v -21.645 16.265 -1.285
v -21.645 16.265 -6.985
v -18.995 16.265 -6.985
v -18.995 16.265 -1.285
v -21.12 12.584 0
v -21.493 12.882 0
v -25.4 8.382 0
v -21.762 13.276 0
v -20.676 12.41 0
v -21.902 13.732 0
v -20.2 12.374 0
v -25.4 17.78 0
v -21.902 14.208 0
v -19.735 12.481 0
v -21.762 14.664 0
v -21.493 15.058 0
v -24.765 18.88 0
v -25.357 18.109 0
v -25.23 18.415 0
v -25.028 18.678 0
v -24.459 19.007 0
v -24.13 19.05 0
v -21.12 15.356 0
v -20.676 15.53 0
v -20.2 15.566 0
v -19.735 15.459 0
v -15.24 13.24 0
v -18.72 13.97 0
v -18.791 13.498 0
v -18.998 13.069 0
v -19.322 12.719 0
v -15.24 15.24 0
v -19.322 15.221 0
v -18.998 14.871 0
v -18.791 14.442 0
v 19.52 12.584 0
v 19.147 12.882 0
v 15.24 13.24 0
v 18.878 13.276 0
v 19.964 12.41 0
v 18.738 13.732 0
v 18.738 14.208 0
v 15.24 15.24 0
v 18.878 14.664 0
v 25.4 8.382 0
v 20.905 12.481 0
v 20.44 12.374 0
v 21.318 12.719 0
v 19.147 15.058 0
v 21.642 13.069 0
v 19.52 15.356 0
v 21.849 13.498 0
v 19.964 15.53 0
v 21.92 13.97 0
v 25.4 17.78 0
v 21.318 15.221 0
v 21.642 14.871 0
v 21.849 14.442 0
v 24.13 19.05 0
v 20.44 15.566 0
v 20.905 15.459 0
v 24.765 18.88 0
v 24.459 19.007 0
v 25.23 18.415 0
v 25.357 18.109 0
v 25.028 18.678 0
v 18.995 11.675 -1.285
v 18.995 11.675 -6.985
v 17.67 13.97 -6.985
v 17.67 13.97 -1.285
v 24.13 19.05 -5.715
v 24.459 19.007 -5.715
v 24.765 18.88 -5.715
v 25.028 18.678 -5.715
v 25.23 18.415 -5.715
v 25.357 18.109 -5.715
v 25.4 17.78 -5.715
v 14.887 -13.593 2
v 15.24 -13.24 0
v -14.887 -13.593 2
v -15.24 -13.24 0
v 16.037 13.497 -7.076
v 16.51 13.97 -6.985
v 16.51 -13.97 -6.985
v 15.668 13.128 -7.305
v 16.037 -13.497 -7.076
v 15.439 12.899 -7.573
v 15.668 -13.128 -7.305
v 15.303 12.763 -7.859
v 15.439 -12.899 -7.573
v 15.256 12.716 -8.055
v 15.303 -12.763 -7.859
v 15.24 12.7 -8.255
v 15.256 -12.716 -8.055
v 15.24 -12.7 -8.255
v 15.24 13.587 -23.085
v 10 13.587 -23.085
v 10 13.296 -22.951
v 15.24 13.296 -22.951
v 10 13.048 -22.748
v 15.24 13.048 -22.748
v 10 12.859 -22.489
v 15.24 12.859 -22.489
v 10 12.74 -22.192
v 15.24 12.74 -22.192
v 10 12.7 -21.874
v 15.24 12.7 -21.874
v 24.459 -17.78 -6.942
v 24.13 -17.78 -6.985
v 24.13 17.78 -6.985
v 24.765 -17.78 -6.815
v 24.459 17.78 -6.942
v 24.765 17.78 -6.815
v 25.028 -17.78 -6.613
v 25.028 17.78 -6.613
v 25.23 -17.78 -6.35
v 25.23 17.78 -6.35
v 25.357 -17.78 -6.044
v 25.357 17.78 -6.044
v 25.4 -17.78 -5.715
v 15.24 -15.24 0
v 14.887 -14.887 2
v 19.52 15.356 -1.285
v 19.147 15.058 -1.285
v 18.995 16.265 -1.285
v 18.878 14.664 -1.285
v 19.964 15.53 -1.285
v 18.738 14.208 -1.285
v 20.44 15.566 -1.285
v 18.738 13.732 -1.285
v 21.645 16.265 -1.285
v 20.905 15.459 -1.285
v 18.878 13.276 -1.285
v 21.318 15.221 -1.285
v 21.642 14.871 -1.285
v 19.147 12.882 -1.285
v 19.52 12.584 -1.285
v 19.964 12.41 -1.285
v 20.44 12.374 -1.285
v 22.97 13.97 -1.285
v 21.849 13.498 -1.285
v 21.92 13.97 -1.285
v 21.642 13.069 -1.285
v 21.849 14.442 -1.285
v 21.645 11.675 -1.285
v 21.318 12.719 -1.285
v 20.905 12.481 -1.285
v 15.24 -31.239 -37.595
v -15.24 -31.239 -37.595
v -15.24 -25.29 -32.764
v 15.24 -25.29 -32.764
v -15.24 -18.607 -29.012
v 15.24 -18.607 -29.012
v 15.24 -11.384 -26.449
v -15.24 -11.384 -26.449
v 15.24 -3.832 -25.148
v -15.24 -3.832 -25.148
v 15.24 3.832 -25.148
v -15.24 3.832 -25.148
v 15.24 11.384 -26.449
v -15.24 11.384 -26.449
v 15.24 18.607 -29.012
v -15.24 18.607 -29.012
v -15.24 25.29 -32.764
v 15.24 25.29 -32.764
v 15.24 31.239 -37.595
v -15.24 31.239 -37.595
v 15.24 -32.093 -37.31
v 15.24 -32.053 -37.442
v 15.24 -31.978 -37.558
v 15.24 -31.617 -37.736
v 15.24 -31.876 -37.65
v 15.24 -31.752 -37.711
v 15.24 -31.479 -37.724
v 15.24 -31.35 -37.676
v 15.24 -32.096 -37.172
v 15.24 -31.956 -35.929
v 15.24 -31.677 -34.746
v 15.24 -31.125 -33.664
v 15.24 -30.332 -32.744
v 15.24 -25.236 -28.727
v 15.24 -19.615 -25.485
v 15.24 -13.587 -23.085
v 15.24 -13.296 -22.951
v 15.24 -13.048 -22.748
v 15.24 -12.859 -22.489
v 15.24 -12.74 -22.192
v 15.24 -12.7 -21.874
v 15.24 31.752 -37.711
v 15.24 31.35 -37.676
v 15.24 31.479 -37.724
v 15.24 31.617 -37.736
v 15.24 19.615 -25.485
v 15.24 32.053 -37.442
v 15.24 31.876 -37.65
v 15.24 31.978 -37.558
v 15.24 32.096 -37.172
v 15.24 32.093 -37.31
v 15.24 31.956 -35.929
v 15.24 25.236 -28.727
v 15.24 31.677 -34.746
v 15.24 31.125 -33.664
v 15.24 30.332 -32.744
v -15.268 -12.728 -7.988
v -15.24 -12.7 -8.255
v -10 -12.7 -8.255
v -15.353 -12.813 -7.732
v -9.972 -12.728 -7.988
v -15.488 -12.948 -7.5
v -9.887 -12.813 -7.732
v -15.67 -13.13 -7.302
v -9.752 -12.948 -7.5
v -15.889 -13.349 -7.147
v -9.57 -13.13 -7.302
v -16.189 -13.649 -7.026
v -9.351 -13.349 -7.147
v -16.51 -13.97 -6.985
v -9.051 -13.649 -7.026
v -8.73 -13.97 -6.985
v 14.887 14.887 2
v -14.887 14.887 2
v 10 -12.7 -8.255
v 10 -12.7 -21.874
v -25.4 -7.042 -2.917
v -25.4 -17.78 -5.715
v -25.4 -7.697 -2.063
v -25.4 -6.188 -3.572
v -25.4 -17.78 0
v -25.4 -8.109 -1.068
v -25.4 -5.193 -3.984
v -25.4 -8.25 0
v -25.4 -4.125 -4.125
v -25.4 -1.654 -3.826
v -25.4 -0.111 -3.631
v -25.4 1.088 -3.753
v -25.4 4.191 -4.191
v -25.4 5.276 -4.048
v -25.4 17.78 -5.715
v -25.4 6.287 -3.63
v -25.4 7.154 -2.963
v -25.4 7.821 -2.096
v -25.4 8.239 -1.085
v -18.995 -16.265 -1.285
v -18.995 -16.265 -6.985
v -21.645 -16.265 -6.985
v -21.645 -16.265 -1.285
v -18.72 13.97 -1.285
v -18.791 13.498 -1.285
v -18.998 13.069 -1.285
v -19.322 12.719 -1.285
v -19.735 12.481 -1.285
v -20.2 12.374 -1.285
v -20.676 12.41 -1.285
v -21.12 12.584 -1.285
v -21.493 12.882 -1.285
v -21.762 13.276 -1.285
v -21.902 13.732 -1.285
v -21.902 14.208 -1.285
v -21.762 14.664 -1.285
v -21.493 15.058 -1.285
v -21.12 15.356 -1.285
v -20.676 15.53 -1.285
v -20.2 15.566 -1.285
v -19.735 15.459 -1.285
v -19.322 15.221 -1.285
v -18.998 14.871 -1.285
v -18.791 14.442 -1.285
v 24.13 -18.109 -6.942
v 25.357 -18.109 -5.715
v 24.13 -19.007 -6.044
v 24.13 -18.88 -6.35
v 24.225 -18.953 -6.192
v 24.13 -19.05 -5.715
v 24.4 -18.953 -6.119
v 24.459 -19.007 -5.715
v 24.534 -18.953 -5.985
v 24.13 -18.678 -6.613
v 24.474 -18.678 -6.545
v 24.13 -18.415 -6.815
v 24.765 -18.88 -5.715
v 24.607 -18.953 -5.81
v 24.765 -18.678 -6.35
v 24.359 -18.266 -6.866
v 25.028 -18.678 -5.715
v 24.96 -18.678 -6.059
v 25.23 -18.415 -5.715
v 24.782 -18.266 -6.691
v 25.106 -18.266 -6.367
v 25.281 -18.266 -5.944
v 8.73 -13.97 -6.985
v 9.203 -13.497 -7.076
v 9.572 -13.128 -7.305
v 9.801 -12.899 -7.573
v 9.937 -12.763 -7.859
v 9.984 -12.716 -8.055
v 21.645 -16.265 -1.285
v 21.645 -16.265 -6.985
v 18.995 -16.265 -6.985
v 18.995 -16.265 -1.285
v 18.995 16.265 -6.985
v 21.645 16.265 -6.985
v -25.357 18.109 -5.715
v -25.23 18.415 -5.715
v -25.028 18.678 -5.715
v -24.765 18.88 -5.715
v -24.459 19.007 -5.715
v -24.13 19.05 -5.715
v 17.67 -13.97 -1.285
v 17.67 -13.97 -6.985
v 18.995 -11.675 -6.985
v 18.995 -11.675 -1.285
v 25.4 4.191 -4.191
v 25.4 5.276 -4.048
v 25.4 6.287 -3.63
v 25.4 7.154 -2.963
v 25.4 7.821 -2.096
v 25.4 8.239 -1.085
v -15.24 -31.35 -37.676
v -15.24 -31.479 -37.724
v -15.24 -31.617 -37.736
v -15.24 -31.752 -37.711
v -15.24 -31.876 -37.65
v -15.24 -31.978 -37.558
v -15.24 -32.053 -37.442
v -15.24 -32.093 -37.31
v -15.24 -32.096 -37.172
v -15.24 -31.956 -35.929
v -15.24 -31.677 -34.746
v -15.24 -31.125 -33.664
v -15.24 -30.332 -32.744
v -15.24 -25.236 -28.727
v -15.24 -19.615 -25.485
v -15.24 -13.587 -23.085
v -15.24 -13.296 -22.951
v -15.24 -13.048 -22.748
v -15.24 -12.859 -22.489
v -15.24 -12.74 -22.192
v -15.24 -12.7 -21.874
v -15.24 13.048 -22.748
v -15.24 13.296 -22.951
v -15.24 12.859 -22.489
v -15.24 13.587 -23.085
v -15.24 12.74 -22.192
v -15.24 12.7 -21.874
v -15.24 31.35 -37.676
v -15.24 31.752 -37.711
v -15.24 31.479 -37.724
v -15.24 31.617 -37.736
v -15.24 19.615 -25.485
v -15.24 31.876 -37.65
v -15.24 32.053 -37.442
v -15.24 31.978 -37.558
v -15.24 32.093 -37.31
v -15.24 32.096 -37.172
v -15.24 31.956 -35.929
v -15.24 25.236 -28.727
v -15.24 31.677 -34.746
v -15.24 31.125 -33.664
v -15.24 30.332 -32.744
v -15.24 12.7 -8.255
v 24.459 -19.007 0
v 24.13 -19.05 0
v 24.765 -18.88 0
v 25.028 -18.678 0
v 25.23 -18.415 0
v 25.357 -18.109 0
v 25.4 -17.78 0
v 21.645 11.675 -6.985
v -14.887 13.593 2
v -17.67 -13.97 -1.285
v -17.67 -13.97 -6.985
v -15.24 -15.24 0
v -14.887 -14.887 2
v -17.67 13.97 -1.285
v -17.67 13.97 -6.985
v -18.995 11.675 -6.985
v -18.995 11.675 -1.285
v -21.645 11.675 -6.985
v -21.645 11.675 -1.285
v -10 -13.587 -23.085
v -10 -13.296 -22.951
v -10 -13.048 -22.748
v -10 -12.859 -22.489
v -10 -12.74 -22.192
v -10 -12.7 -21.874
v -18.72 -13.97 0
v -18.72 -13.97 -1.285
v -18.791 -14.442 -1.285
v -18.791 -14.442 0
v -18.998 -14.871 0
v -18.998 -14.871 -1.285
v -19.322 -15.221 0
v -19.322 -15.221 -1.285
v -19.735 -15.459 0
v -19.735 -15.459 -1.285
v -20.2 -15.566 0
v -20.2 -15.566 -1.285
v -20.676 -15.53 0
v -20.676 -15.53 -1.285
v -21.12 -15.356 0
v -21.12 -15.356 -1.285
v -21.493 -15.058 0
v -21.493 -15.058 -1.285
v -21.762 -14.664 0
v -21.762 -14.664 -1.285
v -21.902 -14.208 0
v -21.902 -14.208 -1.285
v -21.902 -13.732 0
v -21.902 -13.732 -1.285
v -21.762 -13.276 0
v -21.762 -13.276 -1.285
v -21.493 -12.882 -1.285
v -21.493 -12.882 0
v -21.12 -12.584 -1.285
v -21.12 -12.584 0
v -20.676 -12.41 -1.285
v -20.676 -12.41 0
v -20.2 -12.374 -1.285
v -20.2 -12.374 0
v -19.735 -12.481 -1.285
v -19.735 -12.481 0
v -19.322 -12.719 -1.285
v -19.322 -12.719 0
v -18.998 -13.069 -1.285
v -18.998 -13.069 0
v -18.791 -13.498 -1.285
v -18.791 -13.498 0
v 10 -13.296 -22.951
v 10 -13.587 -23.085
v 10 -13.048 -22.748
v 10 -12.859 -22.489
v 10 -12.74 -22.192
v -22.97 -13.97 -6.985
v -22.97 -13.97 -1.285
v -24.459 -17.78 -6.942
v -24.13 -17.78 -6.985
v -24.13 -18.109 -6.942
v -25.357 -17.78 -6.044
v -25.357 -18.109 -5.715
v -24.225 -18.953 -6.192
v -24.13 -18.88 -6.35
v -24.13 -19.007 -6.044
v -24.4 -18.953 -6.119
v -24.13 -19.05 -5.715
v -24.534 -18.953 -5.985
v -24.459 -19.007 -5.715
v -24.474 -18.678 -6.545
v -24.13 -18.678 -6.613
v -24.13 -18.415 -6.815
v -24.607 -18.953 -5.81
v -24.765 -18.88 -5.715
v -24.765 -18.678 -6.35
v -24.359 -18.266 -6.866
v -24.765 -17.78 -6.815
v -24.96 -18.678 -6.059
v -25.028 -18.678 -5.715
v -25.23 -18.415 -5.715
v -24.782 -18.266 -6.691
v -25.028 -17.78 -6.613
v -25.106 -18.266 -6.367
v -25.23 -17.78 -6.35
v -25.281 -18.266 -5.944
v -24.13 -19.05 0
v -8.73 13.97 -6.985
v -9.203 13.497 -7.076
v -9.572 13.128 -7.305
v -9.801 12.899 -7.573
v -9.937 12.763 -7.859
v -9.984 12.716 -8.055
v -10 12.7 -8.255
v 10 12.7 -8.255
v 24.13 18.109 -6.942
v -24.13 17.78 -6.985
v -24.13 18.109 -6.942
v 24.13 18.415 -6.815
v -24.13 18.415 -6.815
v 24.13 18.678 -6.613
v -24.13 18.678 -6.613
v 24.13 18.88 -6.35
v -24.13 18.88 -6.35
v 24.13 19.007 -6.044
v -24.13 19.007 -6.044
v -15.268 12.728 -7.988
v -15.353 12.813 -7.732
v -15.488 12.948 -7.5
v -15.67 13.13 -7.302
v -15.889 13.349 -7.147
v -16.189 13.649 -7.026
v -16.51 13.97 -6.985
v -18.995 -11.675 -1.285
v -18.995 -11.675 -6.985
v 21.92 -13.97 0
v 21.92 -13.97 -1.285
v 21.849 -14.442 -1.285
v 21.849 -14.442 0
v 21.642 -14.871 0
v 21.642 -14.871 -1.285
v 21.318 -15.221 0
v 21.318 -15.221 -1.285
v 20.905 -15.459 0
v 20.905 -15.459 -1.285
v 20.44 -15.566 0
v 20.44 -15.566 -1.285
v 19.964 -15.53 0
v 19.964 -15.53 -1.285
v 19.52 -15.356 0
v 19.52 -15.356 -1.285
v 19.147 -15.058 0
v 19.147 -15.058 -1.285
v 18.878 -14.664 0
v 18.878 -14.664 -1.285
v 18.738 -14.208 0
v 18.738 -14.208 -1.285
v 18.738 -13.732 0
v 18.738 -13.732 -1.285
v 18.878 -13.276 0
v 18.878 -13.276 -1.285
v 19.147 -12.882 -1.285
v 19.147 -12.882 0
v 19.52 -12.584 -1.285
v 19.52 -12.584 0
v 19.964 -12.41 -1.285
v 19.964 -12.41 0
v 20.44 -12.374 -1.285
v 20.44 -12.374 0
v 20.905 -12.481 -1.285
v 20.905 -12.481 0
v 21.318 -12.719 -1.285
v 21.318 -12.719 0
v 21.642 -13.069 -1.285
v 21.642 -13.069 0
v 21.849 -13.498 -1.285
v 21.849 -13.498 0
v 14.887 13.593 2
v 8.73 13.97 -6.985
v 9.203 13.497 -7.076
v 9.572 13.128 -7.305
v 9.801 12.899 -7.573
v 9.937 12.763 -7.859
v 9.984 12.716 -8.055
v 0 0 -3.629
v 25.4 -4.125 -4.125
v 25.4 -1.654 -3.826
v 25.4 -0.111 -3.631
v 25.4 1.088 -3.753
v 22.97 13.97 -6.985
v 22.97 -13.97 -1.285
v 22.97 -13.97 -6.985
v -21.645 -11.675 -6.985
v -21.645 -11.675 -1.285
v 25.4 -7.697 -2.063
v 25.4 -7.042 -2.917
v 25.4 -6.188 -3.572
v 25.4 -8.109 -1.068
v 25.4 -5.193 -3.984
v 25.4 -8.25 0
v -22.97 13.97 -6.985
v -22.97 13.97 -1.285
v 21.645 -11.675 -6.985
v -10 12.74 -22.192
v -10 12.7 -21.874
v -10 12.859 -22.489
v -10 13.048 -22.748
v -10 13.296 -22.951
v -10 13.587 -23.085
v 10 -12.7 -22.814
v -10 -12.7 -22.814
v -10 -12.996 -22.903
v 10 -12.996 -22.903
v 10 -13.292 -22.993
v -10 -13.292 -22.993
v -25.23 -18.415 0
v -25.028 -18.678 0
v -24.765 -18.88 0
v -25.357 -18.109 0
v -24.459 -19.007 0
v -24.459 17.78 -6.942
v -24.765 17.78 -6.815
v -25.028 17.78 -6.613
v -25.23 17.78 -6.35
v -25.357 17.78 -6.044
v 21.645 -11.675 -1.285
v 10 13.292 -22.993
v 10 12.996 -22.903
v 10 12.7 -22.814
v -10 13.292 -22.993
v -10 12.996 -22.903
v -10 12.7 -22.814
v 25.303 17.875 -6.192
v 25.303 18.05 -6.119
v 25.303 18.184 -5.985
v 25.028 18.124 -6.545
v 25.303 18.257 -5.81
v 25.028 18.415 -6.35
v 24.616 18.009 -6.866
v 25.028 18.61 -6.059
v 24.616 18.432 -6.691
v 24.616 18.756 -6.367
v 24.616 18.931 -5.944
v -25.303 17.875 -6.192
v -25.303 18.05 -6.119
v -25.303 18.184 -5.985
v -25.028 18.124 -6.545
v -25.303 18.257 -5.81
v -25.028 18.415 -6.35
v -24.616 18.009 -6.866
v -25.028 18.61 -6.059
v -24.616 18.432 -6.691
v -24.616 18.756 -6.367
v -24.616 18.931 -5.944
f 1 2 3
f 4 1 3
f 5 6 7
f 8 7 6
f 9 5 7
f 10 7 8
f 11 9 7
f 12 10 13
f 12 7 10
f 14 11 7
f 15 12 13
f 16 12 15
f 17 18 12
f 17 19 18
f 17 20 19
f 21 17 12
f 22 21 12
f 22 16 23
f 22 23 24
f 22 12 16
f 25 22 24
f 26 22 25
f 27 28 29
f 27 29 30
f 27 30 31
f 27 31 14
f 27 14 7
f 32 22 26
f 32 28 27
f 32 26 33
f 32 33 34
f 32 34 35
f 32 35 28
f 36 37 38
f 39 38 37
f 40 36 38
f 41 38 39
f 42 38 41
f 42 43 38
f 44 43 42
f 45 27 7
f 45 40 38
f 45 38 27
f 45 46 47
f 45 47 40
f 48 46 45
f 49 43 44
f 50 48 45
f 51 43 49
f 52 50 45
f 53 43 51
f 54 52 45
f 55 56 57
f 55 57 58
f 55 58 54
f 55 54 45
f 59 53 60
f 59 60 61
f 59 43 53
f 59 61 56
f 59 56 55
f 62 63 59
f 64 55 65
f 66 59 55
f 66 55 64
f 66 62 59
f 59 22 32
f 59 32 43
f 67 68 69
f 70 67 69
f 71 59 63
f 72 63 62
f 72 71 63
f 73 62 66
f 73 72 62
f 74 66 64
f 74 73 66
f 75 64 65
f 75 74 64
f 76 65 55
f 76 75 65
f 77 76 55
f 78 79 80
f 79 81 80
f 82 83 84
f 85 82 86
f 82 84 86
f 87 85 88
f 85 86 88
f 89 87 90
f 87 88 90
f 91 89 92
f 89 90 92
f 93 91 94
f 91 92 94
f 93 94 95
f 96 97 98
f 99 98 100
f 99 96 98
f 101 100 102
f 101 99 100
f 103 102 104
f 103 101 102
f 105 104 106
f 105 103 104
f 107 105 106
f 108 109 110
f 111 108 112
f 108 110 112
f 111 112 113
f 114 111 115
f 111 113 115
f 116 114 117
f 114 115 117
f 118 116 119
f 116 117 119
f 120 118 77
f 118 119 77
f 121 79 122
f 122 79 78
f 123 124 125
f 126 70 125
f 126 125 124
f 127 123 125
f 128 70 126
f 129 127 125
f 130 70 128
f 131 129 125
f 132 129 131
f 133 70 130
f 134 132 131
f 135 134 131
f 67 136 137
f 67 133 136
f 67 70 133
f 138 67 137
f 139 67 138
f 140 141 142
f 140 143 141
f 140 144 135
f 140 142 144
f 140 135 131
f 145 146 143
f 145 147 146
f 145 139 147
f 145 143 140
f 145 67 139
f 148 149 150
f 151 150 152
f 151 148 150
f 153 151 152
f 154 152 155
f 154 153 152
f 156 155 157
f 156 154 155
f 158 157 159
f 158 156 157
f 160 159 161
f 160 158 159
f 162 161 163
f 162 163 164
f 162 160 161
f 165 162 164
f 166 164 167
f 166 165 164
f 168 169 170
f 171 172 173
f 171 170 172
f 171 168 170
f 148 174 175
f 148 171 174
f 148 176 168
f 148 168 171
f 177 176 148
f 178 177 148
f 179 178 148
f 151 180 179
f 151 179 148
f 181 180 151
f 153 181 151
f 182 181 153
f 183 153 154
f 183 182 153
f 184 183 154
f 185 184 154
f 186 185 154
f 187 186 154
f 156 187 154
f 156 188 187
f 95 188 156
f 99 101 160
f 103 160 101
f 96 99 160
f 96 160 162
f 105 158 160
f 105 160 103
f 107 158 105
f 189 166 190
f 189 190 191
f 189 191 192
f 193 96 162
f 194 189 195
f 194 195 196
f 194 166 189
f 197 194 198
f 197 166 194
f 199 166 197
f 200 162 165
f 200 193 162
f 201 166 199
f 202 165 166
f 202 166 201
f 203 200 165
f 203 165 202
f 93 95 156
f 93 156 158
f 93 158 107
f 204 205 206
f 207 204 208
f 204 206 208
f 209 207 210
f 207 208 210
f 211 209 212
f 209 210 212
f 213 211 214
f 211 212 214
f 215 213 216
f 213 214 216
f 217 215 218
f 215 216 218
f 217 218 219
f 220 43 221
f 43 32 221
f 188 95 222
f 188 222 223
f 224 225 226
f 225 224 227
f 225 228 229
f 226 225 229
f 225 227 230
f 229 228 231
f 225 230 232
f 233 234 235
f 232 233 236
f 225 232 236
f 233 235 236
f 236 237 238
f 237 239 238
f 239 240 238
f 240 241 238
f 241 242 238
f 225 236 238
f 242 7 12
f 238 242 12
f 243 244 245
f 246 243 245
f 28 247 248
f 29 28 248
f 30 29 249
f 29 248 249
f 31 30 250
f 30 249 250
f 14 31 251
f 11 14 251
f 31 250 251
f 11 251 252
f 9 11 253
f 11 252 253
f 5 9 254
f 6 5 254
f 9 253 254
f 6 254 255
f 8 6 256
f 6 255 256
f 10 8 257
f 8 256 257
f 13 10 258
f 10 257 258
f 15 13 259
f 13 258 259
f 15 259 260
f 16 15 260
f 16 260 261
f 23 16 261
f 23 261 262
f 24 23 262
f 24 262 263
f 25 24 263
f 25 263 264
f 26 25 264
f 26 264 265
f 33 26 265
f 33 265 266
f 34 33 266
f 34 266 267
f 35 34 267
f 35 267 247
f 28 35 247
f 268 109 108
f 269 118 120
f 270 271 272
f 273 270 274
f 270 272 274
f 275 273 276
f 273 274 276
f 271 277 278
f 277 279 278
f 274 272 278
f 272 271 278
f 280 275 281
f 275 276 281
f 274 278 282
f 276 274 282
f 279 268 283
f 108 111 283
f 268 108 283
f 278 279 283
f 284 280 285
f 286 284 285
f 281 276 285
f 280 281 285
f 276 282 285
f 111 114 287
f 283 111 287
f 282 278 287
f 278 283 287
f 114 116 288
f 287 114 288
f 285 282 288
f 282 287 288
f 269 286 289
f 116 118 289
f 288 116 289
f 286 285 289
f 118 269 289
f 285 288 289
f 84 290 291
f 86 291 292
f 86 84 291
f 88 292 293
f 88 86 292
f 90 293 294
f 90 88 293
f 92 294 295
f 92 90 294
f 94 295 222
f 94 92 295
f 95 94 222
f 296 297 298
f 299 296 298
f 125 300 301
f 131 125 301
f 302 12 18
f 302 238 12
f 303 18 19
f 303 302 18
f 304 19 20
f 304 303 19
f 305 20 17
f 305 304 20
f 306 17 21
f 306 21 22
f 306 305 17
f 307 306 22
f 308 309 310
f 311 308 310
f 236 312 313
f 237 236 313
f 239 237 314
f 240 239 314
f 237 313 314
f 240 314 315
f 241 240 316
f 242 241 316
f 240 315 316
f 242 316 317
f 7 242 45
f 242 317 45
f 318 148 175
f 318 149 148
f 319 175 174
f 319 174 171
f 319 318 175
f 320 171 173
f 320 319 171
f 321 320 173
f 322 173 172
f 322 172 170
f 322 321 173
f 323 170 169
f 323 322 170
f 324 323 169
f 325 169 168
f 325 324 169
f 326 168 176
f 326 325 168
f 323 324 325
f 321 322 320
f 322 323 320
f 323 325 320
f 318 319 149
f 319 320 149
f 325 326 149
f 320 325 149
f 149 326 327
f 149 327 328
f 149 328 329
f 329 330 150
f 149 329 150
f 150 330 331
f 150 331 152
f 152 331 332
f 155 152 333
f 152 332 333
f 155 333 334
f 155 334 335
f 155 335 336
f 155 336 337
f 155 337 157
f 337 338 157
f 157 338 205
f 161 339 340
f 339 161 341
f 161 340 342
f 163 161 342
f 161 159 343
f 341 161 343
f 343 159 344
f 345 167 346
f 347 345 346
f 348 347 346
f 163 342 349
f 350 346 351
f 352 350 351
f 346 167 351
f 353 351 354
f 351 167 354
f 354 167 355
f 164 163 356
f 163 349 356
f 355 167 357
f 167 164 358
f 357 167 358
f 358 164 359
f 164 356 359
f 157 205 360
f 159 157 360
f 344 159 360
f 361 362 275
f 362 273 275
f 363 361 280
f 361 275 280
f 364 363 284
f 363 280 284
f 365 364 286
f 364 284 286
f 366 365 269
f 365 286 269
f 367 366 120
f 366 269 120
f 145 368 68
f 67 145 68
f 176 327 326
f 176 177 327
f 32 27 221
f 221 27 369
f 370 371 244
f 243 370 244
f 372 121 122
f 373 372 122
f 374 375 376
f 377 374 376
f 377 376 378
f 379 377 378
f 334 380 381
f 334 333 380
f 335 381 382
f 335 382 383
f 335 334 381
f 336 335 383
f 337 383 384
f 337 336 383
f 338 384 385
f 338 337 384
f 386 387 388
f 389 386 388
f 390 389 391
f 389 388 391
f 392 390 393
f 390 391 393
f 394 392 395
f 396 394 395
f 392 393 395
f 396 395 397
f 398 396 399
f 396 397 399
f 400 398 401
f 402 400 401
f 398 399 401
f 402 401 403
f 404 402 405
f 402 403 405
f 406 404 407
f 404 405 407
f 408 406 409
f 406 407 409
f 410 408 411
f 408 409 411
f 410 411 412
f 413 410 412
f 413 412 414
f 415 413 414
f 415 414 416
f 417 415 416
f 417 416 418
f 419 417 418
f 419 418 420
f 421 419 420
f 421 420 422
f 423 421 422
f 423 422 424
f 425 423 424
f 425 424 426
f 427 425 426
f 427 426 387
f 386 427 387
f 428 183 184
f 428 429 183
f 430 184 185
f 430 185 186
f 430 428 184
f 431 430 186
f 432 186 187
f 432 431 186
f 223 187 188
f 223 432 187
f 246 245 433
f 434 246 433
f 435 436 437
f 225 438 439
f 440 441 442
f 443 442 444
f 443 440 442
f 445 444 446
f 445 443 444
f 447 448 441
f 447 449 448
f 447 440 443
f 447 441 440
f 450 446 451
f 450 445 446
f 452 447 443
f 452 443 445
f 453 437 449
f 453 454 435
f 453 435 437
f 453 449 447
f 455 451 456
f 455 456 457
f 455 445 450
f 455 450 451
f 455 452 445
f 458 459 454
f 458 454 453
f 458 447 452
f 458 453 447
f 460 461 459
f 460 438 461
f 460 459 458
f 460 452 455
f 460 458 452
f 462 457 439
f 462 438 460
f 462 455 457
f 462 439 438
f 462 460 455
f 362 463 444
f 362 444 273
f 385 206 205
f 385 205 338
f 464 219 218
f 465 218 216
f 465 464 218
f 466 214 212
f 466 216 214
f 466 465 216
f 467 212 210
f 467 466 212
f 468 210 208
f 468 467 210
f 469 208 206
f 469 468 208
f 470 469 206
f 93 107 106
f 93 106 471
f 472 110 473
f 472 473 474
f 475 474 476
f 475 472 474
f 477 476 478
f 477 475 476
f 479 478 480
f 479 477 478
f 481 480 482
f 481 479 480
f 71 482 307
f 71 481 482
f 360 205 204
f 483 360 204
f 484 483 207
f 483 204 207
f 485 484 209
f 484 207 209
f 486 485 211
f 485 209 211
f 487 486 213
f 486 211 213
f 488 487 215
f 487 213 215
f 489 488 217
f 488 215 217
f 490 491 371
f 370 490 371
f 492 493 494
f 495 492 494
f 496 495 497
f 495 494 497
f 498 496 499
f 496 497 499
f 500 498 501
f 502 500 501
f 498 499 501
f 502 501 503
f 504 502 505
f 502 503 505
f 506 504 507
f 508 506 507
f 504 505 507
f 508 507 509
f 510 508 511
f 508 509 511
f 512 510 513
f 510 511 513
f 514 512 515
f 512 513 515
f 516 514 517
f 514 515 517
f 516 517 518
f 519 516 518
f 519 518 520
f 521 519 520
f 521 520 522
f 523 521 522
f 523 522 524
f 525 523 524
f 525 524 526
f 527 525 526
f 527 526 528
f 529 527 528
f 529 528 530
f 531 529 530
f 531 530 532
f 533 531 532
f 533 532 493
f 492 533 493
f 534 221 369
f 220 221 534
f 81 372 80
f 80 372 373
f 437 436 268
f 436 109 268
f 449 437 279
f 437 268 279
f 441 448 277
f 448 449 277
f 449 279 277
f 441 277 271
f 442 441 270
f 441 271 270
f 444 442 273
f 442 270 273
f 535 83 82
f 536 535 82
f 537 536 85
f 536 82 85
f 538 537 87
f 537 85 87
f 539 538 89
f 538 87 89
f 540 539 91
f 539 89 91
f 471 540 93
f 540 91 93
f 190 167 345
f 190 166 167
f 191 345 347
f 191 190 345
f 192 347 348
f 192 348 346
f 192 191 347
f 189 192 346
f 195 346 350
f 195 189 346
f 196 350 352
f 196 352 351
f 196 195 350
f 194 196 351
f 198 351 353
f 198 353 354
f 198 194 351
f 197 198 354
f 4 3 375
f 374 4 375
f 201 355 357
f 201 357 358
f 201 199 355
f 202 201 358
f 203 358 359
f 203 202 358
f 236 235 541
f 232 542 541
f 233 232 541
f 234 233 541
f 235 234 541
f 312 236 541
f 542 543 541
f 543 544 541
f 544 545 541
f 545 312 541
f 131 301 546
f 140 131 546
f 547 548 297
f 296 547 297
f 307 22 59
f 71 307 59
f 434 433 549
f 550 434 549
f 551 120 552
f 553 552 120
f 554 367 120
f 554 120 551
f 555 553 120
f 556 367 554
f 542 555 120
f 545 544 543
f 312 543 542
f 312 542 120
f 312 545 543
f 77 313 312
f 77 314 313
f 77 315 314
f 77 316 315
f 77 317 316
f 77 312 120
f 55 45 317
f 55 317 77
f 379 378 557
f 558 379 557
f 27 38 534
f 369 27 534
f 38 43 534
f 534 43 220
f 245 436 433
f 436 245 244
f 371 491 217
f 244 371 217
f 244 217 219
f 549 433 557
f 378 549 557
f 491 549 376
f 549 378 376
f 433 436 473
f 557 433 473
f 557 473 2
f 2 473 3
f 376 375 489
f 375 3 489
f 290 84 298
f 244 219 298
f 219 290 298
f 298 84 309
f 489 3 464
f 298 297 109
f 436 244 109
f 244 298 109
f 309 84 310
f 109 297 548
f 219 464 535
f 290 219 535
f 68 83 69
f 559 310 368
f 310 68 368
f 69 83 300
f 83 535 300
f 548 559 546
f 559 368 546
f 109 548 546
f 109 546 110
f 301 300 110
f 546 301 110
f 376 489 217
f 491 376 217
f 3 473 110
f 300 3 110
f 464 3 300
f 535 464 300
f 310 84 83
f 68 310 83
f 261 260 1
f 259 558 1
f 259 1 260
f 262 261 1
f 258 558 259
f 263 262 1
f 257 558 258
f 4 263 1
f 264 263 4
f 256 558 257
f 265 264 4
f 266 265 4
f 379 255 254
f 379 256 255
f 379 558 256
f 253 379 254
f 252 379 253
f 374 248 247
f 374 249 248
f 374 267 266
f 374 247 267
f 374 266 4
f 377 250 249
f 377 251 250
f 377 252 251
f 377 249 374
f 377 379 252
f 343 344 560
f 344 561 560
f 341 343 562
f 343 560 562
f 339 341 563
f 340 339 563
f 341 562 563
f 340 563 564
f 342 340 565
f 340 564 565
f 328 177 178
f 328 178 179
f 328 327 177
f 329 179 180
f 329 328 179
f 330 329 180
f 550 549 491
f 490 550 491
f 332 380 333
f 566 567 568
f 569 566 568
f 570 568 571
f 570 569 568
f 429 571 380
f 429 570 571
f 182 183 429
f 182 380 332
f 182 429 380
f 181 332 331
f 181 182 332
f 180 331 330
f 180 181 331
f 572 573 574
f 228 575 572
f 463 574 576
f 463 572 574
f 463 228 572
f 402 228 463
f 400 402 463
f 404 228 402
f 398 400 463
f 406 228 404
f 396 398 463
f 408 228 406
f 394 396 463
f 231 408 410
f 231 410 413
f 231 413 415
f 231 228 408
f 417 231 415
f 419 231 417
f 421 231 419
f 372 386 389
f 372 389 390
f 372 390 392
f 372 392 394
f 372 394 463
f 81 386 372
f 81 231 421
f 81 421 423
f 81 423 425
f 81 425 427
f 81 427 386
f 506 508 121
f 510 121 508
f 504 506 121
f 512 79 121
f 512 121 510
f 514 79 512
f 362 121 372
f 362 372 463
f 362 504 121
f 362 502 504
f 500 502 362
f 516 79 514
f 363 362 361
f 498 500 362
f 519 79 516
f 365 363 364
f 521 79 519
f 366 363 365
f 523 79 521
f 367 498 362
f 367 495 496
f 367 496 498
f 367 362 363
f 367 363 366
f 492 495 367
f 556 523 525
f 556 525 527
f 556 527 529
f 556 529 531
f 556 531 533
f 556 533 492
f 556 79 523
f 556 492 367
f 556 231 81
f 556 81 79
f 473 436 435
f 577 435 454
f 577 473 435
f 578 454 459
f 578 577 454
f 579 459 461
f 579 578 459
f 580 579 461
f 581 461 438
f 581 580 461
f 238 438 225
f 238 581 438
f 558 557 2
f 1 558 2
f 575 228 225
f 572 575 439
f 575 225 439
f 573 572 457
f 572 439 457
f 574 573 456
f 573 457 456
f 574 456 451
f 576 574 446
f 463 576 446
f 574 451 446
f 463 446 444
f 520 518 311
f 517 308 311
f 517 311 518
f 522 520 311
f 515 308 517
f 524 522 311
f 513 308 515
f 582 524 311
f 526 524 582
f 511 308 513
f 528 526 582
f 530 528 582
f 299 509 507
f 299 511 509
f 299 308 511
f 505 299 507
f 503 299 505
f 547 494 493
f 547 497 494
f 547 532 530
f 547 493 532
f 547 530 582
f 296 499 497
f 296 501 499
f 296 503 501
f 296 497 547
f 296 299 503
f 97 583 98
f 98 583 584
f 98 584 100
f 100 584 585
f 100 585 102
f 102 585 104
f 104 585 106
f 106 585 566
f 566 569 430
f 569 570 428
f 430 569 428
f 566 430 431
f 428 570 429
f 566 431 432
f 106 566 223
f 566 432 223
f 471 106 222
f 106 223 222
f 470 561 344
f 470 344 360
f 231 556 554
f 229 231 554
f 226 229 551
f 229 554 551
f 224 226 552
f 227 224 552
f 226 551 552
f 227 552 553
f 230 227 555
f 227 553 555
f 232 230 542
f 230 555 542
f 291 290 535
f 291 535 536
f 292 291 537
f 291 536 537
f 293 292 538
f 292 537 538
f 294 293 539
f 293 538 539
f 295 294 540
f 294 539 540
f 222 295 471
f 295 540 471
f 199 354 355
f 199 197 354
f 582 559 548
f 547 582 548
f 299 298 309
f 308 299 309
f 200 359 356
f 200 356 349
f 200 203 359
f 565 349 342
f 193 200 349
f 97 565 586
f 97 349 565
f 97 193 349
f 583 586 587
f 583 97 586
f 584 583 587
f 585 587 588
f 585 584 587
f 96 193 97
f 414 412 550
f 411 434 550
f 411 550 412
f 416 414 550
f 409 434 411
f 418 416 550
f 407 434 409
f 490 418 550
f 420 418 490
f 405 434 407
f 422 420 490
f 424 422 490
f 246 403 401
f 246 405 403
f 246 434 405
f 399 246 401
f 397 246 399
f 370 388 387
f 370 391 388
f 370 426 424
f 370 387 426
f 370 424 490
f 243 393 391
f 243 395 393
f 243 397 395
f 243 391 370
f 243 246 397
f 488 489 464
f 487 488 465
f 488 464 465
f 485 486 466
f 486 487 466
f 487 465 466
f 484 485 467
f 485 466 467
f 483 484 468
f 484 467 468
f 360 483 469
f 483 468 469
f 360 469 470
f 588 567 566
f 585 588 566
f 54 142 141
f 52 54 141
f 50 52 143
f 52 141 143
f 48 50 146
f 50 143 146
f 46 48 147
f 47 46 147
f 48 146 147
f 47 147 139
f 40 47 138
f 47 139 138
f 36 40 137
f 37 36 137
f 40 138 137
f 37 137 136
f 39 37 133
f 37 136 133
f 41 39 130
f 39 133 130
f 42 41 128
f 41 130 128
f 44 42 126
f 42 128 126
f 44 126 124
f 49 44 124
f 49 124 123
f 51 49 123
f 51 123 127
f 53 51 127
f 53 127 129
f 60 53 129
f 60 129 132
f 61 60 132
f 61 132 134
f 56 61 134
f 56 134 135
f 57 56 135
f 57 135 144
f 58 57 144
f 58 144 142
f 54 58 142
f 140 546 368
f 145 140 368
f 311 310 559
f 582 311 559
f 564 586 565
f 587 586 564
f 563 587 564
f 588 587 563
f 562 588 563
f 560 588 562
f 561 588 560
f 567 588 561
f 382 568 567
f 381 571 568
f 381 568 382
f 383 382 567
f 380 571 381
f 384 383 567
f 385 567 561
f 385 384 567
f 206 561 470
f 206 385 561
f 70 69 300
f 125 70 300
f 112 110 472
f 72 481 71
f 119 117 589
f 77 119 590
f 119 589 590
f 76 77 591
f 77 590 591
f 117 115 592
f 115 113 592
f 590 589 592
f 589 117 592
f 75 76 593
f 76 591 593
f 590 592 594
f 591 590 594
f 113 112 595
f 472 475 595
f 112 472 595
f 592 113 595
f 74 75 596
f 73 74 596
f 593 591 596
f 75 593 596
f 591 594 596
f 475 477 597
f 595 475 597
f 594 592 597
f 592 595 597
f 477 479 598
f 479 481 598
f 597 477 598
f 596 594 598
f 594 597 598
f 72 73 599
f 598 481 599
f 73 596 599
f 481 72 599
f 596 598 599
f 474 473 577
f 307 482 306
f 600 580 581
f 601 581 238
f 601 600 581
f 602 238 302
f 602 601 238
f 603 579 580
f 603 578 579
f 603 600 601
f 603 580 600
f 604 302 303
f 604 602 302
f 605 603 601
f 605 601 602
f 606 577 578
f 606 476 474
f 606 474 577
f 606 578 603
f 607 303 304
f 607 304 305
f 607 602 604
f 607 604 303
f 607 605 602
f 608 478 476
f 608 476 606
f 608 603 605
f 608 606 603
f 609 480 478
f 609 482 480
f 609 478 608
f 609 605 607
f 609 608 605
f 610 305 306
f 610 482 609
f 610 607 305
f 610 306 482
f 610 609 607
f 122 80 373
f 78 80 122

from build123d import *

# Parameters (mm, degrees)
F1_W          = 50.8
F1_H          = 38.1
F2_DEPTH      = 6.985
F4_DEPTH      = 50.8
F6_DEPTH      = 15.24
F6_DEPTH_BACK = 15.24
F7_W          = 20
F7_H          = 15.8292923384
F8_DEPTH      = 25.4
F9_R          = 1.6
F10_DEPTH     = 25.4
F11_R         = 1.6
F12_DEPTH     = 5.7
F13_W         = 30.48
F13_H         = 2
F14_DEPTH     = 2
F14_TAPER     = 10
F15_R         = 0.508
F16_R         = 5.08
F17_R         = 1.27


# Not quite as in the source:
# - two fillets or chamfers of one size are made in one step


with BuildPart() as f2:
    # F1 (on Top) → F2 (new body)
    with BuildSketch(Plane.XY):
        Rectangle(F1_W, F1_H)
    extrude(amount=-F2_DEPTH)

    # F3 (on face) → F4 (cut, through all)
    with BuildSketch(Plane.YZ.offset(25.4)):
        with BuildLine():
            add(Edge.make_bspline(
                [(-4.125, 4.125), (-2.4255892558, 4.1137489608), (-0.0276085061, 2.971292738), (2.5249406681, 4.1137612248), (4.191, 4.191)],
                knots=[0, 0, 0, 0, 0.4977710734, 1, 1, 1, 1], degree=3))
            ThreePointArc((-4.125, 4.125), (-7.0418154724, 2.9168154724), (-8.25, 0))
            ThreePointArc((-8.25, 0), (-7.0418154724, -2.9168154724), (-4.125, -4.125))
            add(Edge.make_bspline(
                [(-4.125, -4.125), (-2.9335741419, -4.2006121948), (0.4172014685, -3.0581585459), (2.1438994445, -4.2006121948), (4.191, -4.191)],
                knots=[0, 0, 0, 0, 0.497799261, 1, 1, 1, 1], degree=3))
            ThreePointArc((4.191, -4.191), (7.15448452, -2.96348452), (8.382, 0))
            ThreePointArc((8.382, 0), (7.15448452, 2.96348452), (4.191, 4.191))
        make_face()
    extrude(amount=-F4_DEPTH, mode=Mode.SUBTRACT)

    # F5 (on Right) → F6 (join, two sides)
    with BuildSketch(Plane.YZ) as f6_sk:
        with BuildLine():
            ThreePointArc((-32.258, -38.6095089919), (0, -24.985), (32.258, -38.6095089919))
            Line((32.258, -38.6095089919), (31.75, -34.0955424944))
            ThreePointArc((31.75, -34.0955424944), (22.9296157026, -27.265073299), (12.7, -22.8142923384))
            ThreePointArc((12.7, -22.8142923384), (0, -20.985), (-12.7, -22.8142923384))
            ThreePointArc((-12.7, -22.8142923384), (-22.9296157026, -27.265073299), (-31.75, -34.0955424944))
            Line((-31.75, -34.0955424944), (-32.258, -38.6095089919))
        make_face()
        with BuildLine():
            ThreePointArc((-12.7, -22.8142923384), (0, -20.985), (12.7, -22.8142923384))
            Line((12.7, -22.8142923384), (12.7, -6.985))
            Line((12.7, -6.985), (-12.7, -6.985))
            Line((-12.7, -6.985), (-12.7, -22.8142923384))
        make_face()
    extrude(amount=F6_DEPTH)
    extrude(f6_sk.sketch, amount=-F6_DEPTH_BACK)

    # F7 (on face) → F8 (cut)
    with BuildSketch(Plane.XZ.offset(12.7)):
        with Locations((0, -14.8996461692)):
            Rectangle(F7_W, F7_H)
    extrude(amount=-F8_DEPTH, mode=Mode.SUBTRACT)

    # F9 (on face) → F10 (cut)
    with BuildSketch(Plane(origin=(0, 0, -6.985), x_dir=(1, 0, 0), z_dir=(0, 0, -1))):
        with Locations((20.32, -13.97)):
            Circle(F9_R)
        with Locations((-20.32, -13.97)):
            Circle(F9_R)
        with Locations((-20.32, 13.97)):
            Circle(F9_R)
        with Locations((20.32, 13.97)):
            Circle(F9_R)
    extrude(amount=-F10_DEPTH, mode=Mode.SUBTRACT)

    # F11 (on face) → F12 (cut)
    with BuildSketch(Plane(origin=(0, 0, -6.985), x_dir=(1, 0, 0), z_dir=(0, 0, -1))):
        Polygon((21.645, -16.26496732), (22.97, -13.97), (21.645, -11.67503268), (18.995, -11.67503268), (17.67, -13.97), (18.995, -16.26496732), align=None)
        with Locations((20.32, -13.97)):
            Circle(F11_R, mode=Mode.SUBTRACT)
        Polygon((-18.995, -11.67503268), (-21.645, -11.67503268), (-22.97, -13.97), (-21.645, -16.26496732), (-18.995, -16.26496732), (-17.67, -13.97), align=None)
        with Locations((-20.32, -13.97)):
            Circle(F11_R, mode=Mode.SUBTRACT)
        Polygon((-18.995, 11.67503268), (-17.67, 13.97), (-18.995, 16.26496732), (-21.645, 16.26496732), (-22.97, 13.97), (-21.645, 11.67503268), align=None)
        with Locations((-20.32, 13.97)):
            Circle(F11_R, mode=Mode.SUBTRACT)
        Polygon((18.995, 11.67503268), (21.645, 11.67503268), (22.97, 13.97), (21.645, 16.26496732), (18.995, 16.26496732), (17.67, 13.97), align=None)
        with Locations((20.32, 13.97)):
            Circle(F11_R, mode=Mode.SUBTRACT)
    extrude(amount=-F12_DEPTH, mode=Mode.SUBTRACT)

    # F13 (on face) → F14 (join)
    with BuildSketch(Plane.XY):
        with Locations((0, 14.24)):
            Rectangle(F13_W, F13_H)
        with Locations((0, -14.24)):
            Rectangle(F13_W, F13_H)
    extrude(amount=F14_DEPTH, taper=F14_TAPER)

    # F15
    f15_edges = [f2.edges().sort_by_distance(p)[0] for p in [
        (0, 32.258, -38.609509),
        (0, -32.258, -38.609509),
    ]]
    fillet(f15_edges, radius=F15_R)

    # F16
    f16_edges = [f2.edges().sort_by_distance(p)[0] for p in [
        (0, 31.75, -34.095542),
        (0, -31.75, -34.095542),
    ]]
    fillet(f16_edges, radius=F16_R)

    # F17
    f17_edges = [f2.edges().sort_by_distance(p)[0] for p in [
        (-15.24, 0, -6.985),
        (12.62, -12.7, -22.814292),
        (-12.62, -12.7, -22.814292),
        (-12.62, -12.7, -6.985),
        (0, 19.05, -6.985),
        (25.4, 0, -6.985),
        (-25.4, 0, -6.985),
        (0, -19.05, -6.985),
        (-12.62, 12.7, -6.985),
        (-10, 0, -6.985),
        (12.62, -12.7, -6.985),
        (10, 0, -6.985),
        (15.24, 0, -6.985),
        (12.62, 12.7, -6.985),
        (-12.62, 12.7, -22.814292),
        (12.62, 12.7, -22.814292),
        (25.4, 19.05, -3.4925),
        (-25.4, 19.05, -3.4925),
        (25.4, -19.05, -3.4925),
        (-25.4, -19.05, -3.4925),
    ]]
    fillet(f17_edges, radius=F17_R)


solid = f2.part
